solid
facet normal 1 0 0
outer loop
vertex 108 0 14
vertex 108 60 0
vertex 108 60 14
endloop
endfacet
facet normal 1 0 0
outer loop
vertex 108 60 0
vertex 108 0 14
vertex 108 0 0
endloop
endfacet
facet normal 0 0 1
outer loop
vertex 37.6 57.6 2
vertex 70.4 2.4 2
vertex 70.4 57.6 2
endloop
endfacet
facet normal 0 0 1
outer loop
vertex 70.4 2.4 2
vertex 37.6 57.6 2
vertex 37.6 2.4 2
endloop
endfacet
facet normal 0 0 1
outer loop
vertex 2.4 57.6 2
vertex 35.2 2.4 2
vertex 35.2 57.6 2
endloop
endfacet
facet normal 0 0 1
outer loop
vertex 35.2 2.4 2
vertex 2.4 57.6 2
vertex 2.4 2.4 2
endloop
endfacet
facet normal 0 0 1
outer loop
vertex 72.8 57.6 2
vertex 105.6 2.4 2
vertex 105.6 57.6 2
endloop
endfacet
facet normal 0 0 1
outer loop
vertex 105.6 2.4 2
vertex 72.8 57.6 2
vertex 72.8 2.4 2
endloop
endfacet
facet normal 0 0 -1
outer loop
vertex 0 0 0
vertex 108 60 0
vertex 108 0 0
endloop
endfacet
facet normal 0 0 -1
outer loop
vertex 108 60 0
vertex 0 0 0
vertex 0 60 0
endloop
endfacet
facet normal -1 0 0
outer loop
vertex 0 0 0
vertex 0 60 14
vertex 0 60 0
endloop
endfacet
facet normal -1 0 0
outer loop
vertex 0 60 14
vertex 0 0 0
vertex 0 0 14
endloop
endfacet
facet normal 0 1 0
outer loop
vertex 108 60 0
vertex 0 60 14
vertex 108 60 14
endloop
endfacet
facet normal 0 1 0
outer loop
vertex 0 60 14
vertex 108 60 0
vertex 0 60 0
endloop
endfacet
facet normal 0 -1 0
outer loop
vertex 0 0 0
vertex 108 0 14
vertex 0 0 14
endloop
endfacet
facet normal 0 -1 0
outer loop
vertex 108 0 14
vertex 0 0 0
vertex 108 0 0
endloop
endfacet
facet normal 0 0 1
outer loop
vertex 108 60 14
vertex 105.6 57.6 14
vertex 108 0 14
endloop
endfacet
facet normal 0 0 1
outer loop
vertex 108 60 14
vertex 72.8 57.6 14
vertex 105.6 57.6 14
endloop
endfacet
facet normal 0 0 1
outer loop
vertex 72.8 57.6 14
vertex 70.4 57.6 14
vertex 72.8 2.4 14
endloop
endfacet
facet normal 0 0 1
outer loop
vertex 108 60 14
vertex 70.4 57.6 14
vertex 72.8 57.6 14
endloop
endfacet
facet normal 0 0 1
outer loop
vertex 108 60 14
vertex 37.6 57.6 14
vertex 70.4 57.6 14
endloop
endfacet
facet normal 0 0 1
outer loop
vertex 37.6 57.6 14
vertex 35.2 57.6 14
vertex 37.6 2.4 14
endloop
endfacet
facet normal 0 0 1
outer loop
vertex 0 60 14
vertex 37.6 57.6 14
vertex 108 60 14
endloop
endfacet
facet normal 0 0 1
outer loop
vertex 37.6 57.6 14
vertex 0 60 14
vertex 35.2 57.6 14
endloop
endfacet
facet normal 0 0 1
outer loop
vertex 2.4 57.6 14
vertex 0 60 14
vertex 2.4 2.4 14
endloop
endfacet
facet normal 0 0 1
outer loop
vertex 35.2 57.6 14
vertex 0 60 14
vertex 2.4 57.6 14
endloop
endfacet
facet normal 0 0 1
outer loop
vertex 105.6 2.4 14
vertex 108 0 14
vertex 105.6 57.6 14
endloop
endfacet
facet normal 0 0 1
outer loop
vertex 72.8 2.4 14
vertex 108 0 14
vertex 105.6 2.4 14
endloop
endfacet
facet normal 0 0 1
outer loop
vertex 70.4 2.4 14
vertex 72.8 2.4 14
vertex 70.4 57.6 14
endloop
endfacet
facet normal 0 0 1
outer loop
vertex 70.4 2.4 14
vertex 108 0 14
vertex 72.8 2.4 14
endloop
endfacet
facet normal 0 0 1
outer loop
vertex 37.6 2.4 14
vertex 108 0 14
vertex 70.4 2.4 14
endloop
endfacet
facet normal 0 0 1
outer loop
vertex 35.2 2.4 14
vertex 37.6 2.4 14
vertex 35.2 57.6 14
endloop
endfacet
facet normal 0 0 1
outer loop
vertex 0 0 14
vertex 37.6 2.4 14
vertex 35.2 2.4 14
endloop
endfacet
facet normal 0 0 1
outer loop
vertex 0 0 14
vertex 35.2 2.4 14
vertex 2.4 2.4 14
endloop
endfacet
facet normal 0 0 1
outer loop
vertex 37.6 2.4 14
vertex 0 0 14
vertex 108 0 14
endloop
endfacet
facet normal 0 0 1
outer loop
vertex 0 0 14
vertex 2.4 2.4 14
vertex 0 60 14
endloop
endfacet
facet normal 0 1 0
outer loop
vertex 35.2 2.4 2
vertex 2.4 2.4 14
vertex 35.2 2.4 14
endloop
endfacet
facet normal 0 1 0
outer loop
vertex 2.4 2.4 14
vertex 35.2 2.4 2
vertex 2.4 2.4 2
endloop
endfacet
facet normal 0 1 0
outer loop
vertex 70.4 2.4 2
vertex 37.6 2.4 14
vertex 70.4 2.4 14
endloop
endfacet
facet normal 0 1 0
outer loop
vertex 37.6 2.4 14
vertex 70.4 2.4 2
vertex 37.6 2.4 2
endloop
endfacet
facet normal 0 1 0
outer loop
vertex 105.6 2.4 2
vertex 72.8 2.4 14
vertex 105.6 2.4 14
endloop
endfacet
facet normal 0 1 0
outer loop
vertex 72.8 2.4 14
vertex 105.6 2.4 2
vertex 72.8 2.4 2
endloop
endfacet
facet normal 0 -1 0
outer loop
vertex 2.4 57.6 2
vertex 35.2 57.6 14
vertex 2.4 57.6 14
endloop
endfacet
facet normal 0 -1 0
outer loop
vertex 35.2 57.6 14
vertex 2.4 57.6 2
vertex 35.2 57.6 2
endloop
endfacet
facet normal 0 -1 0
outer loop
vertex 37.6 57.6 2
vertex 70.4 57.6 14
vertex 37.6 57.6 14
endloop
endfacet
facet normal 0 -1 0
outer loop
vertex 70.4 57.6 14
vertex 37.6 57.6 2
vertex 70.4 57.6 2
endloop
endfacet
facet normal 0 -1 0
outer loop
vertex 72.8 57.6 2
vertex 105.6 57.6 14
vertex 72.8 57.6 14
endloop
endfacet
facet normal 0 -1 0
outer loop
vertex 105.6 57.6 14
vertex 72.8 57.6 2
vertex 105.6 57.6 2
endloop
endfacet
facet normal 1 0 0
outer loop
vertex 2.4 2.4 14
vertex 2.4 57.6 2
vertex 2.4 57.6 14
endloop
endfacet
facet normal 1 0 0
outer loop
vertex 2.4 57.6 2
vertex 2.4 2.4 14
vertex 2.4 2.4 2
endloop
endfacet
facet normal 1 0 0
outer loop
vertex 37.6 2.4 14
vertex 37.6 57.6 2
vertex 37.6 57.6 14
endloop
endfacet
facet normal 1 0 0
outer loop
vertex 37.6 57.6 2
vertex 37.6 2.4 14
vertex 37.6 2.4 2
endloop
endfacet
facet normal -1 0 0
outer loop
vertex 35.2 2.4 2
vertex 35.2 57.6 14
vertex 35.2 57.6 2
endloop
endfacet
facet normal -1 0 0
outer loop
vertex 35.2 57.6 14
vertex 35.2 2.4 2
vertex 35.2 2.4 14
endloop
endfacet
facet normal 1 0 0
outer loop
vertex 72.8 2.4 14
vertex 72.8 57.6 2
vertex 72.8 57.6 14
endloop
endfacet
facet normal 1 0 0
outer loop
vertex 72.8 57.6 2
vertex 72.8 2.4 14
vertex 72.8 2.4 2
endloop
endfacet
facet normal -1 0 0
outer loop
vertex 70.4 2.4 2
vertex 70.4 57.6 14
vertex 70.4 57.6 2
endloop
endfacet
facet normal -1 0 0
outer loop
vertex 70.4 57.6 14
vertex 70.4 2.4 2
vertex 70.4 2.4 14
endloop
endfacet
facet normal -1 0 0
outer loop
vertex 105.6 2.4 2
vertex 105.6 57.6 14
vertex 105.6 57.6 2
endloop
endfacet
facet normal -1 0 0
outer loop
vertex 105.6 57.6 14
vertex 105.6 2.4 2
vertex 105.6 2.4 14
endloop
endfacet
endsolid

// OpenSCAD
// SPDX-License-Identifier: CC-BY-4.0
// Original design: OpenPrintLab contributors. Units: mm.
// Generated inspection snapshot; edit models/recipes.py and catalog.json to customize.
// https://github.com/Prashanth261993/OpenPrintLab
union() {
  translate([0.000000, 0.000000, 0.000000]) cube([108.000000, 60.000000, 2.000000]);
  translate([0.000000, 0.000000, 2.000000]) cube([108.000000, 2.400000, 12.000000]);
  translate([0.000000, 57.600000, 2.000000]) cube([108.000000, 2.400000, 12.000000]);
  translate([0.000000, 2.400000, 2.000000]) cube([2.400000, 55.200000, 12.000000]);
  translate([35.200000, 2.400000, 2.000000]) cube([2.400000, 55.200000, 12.000000]);
  translate([70.400000, 2.400000, 2.000000]) cube([2.400000, 55.200000, 12.000000]);
  translate([105.600000, 2.400000, 2.000000]) cube([2.400000, 55.200000, 12.000000]);
}
